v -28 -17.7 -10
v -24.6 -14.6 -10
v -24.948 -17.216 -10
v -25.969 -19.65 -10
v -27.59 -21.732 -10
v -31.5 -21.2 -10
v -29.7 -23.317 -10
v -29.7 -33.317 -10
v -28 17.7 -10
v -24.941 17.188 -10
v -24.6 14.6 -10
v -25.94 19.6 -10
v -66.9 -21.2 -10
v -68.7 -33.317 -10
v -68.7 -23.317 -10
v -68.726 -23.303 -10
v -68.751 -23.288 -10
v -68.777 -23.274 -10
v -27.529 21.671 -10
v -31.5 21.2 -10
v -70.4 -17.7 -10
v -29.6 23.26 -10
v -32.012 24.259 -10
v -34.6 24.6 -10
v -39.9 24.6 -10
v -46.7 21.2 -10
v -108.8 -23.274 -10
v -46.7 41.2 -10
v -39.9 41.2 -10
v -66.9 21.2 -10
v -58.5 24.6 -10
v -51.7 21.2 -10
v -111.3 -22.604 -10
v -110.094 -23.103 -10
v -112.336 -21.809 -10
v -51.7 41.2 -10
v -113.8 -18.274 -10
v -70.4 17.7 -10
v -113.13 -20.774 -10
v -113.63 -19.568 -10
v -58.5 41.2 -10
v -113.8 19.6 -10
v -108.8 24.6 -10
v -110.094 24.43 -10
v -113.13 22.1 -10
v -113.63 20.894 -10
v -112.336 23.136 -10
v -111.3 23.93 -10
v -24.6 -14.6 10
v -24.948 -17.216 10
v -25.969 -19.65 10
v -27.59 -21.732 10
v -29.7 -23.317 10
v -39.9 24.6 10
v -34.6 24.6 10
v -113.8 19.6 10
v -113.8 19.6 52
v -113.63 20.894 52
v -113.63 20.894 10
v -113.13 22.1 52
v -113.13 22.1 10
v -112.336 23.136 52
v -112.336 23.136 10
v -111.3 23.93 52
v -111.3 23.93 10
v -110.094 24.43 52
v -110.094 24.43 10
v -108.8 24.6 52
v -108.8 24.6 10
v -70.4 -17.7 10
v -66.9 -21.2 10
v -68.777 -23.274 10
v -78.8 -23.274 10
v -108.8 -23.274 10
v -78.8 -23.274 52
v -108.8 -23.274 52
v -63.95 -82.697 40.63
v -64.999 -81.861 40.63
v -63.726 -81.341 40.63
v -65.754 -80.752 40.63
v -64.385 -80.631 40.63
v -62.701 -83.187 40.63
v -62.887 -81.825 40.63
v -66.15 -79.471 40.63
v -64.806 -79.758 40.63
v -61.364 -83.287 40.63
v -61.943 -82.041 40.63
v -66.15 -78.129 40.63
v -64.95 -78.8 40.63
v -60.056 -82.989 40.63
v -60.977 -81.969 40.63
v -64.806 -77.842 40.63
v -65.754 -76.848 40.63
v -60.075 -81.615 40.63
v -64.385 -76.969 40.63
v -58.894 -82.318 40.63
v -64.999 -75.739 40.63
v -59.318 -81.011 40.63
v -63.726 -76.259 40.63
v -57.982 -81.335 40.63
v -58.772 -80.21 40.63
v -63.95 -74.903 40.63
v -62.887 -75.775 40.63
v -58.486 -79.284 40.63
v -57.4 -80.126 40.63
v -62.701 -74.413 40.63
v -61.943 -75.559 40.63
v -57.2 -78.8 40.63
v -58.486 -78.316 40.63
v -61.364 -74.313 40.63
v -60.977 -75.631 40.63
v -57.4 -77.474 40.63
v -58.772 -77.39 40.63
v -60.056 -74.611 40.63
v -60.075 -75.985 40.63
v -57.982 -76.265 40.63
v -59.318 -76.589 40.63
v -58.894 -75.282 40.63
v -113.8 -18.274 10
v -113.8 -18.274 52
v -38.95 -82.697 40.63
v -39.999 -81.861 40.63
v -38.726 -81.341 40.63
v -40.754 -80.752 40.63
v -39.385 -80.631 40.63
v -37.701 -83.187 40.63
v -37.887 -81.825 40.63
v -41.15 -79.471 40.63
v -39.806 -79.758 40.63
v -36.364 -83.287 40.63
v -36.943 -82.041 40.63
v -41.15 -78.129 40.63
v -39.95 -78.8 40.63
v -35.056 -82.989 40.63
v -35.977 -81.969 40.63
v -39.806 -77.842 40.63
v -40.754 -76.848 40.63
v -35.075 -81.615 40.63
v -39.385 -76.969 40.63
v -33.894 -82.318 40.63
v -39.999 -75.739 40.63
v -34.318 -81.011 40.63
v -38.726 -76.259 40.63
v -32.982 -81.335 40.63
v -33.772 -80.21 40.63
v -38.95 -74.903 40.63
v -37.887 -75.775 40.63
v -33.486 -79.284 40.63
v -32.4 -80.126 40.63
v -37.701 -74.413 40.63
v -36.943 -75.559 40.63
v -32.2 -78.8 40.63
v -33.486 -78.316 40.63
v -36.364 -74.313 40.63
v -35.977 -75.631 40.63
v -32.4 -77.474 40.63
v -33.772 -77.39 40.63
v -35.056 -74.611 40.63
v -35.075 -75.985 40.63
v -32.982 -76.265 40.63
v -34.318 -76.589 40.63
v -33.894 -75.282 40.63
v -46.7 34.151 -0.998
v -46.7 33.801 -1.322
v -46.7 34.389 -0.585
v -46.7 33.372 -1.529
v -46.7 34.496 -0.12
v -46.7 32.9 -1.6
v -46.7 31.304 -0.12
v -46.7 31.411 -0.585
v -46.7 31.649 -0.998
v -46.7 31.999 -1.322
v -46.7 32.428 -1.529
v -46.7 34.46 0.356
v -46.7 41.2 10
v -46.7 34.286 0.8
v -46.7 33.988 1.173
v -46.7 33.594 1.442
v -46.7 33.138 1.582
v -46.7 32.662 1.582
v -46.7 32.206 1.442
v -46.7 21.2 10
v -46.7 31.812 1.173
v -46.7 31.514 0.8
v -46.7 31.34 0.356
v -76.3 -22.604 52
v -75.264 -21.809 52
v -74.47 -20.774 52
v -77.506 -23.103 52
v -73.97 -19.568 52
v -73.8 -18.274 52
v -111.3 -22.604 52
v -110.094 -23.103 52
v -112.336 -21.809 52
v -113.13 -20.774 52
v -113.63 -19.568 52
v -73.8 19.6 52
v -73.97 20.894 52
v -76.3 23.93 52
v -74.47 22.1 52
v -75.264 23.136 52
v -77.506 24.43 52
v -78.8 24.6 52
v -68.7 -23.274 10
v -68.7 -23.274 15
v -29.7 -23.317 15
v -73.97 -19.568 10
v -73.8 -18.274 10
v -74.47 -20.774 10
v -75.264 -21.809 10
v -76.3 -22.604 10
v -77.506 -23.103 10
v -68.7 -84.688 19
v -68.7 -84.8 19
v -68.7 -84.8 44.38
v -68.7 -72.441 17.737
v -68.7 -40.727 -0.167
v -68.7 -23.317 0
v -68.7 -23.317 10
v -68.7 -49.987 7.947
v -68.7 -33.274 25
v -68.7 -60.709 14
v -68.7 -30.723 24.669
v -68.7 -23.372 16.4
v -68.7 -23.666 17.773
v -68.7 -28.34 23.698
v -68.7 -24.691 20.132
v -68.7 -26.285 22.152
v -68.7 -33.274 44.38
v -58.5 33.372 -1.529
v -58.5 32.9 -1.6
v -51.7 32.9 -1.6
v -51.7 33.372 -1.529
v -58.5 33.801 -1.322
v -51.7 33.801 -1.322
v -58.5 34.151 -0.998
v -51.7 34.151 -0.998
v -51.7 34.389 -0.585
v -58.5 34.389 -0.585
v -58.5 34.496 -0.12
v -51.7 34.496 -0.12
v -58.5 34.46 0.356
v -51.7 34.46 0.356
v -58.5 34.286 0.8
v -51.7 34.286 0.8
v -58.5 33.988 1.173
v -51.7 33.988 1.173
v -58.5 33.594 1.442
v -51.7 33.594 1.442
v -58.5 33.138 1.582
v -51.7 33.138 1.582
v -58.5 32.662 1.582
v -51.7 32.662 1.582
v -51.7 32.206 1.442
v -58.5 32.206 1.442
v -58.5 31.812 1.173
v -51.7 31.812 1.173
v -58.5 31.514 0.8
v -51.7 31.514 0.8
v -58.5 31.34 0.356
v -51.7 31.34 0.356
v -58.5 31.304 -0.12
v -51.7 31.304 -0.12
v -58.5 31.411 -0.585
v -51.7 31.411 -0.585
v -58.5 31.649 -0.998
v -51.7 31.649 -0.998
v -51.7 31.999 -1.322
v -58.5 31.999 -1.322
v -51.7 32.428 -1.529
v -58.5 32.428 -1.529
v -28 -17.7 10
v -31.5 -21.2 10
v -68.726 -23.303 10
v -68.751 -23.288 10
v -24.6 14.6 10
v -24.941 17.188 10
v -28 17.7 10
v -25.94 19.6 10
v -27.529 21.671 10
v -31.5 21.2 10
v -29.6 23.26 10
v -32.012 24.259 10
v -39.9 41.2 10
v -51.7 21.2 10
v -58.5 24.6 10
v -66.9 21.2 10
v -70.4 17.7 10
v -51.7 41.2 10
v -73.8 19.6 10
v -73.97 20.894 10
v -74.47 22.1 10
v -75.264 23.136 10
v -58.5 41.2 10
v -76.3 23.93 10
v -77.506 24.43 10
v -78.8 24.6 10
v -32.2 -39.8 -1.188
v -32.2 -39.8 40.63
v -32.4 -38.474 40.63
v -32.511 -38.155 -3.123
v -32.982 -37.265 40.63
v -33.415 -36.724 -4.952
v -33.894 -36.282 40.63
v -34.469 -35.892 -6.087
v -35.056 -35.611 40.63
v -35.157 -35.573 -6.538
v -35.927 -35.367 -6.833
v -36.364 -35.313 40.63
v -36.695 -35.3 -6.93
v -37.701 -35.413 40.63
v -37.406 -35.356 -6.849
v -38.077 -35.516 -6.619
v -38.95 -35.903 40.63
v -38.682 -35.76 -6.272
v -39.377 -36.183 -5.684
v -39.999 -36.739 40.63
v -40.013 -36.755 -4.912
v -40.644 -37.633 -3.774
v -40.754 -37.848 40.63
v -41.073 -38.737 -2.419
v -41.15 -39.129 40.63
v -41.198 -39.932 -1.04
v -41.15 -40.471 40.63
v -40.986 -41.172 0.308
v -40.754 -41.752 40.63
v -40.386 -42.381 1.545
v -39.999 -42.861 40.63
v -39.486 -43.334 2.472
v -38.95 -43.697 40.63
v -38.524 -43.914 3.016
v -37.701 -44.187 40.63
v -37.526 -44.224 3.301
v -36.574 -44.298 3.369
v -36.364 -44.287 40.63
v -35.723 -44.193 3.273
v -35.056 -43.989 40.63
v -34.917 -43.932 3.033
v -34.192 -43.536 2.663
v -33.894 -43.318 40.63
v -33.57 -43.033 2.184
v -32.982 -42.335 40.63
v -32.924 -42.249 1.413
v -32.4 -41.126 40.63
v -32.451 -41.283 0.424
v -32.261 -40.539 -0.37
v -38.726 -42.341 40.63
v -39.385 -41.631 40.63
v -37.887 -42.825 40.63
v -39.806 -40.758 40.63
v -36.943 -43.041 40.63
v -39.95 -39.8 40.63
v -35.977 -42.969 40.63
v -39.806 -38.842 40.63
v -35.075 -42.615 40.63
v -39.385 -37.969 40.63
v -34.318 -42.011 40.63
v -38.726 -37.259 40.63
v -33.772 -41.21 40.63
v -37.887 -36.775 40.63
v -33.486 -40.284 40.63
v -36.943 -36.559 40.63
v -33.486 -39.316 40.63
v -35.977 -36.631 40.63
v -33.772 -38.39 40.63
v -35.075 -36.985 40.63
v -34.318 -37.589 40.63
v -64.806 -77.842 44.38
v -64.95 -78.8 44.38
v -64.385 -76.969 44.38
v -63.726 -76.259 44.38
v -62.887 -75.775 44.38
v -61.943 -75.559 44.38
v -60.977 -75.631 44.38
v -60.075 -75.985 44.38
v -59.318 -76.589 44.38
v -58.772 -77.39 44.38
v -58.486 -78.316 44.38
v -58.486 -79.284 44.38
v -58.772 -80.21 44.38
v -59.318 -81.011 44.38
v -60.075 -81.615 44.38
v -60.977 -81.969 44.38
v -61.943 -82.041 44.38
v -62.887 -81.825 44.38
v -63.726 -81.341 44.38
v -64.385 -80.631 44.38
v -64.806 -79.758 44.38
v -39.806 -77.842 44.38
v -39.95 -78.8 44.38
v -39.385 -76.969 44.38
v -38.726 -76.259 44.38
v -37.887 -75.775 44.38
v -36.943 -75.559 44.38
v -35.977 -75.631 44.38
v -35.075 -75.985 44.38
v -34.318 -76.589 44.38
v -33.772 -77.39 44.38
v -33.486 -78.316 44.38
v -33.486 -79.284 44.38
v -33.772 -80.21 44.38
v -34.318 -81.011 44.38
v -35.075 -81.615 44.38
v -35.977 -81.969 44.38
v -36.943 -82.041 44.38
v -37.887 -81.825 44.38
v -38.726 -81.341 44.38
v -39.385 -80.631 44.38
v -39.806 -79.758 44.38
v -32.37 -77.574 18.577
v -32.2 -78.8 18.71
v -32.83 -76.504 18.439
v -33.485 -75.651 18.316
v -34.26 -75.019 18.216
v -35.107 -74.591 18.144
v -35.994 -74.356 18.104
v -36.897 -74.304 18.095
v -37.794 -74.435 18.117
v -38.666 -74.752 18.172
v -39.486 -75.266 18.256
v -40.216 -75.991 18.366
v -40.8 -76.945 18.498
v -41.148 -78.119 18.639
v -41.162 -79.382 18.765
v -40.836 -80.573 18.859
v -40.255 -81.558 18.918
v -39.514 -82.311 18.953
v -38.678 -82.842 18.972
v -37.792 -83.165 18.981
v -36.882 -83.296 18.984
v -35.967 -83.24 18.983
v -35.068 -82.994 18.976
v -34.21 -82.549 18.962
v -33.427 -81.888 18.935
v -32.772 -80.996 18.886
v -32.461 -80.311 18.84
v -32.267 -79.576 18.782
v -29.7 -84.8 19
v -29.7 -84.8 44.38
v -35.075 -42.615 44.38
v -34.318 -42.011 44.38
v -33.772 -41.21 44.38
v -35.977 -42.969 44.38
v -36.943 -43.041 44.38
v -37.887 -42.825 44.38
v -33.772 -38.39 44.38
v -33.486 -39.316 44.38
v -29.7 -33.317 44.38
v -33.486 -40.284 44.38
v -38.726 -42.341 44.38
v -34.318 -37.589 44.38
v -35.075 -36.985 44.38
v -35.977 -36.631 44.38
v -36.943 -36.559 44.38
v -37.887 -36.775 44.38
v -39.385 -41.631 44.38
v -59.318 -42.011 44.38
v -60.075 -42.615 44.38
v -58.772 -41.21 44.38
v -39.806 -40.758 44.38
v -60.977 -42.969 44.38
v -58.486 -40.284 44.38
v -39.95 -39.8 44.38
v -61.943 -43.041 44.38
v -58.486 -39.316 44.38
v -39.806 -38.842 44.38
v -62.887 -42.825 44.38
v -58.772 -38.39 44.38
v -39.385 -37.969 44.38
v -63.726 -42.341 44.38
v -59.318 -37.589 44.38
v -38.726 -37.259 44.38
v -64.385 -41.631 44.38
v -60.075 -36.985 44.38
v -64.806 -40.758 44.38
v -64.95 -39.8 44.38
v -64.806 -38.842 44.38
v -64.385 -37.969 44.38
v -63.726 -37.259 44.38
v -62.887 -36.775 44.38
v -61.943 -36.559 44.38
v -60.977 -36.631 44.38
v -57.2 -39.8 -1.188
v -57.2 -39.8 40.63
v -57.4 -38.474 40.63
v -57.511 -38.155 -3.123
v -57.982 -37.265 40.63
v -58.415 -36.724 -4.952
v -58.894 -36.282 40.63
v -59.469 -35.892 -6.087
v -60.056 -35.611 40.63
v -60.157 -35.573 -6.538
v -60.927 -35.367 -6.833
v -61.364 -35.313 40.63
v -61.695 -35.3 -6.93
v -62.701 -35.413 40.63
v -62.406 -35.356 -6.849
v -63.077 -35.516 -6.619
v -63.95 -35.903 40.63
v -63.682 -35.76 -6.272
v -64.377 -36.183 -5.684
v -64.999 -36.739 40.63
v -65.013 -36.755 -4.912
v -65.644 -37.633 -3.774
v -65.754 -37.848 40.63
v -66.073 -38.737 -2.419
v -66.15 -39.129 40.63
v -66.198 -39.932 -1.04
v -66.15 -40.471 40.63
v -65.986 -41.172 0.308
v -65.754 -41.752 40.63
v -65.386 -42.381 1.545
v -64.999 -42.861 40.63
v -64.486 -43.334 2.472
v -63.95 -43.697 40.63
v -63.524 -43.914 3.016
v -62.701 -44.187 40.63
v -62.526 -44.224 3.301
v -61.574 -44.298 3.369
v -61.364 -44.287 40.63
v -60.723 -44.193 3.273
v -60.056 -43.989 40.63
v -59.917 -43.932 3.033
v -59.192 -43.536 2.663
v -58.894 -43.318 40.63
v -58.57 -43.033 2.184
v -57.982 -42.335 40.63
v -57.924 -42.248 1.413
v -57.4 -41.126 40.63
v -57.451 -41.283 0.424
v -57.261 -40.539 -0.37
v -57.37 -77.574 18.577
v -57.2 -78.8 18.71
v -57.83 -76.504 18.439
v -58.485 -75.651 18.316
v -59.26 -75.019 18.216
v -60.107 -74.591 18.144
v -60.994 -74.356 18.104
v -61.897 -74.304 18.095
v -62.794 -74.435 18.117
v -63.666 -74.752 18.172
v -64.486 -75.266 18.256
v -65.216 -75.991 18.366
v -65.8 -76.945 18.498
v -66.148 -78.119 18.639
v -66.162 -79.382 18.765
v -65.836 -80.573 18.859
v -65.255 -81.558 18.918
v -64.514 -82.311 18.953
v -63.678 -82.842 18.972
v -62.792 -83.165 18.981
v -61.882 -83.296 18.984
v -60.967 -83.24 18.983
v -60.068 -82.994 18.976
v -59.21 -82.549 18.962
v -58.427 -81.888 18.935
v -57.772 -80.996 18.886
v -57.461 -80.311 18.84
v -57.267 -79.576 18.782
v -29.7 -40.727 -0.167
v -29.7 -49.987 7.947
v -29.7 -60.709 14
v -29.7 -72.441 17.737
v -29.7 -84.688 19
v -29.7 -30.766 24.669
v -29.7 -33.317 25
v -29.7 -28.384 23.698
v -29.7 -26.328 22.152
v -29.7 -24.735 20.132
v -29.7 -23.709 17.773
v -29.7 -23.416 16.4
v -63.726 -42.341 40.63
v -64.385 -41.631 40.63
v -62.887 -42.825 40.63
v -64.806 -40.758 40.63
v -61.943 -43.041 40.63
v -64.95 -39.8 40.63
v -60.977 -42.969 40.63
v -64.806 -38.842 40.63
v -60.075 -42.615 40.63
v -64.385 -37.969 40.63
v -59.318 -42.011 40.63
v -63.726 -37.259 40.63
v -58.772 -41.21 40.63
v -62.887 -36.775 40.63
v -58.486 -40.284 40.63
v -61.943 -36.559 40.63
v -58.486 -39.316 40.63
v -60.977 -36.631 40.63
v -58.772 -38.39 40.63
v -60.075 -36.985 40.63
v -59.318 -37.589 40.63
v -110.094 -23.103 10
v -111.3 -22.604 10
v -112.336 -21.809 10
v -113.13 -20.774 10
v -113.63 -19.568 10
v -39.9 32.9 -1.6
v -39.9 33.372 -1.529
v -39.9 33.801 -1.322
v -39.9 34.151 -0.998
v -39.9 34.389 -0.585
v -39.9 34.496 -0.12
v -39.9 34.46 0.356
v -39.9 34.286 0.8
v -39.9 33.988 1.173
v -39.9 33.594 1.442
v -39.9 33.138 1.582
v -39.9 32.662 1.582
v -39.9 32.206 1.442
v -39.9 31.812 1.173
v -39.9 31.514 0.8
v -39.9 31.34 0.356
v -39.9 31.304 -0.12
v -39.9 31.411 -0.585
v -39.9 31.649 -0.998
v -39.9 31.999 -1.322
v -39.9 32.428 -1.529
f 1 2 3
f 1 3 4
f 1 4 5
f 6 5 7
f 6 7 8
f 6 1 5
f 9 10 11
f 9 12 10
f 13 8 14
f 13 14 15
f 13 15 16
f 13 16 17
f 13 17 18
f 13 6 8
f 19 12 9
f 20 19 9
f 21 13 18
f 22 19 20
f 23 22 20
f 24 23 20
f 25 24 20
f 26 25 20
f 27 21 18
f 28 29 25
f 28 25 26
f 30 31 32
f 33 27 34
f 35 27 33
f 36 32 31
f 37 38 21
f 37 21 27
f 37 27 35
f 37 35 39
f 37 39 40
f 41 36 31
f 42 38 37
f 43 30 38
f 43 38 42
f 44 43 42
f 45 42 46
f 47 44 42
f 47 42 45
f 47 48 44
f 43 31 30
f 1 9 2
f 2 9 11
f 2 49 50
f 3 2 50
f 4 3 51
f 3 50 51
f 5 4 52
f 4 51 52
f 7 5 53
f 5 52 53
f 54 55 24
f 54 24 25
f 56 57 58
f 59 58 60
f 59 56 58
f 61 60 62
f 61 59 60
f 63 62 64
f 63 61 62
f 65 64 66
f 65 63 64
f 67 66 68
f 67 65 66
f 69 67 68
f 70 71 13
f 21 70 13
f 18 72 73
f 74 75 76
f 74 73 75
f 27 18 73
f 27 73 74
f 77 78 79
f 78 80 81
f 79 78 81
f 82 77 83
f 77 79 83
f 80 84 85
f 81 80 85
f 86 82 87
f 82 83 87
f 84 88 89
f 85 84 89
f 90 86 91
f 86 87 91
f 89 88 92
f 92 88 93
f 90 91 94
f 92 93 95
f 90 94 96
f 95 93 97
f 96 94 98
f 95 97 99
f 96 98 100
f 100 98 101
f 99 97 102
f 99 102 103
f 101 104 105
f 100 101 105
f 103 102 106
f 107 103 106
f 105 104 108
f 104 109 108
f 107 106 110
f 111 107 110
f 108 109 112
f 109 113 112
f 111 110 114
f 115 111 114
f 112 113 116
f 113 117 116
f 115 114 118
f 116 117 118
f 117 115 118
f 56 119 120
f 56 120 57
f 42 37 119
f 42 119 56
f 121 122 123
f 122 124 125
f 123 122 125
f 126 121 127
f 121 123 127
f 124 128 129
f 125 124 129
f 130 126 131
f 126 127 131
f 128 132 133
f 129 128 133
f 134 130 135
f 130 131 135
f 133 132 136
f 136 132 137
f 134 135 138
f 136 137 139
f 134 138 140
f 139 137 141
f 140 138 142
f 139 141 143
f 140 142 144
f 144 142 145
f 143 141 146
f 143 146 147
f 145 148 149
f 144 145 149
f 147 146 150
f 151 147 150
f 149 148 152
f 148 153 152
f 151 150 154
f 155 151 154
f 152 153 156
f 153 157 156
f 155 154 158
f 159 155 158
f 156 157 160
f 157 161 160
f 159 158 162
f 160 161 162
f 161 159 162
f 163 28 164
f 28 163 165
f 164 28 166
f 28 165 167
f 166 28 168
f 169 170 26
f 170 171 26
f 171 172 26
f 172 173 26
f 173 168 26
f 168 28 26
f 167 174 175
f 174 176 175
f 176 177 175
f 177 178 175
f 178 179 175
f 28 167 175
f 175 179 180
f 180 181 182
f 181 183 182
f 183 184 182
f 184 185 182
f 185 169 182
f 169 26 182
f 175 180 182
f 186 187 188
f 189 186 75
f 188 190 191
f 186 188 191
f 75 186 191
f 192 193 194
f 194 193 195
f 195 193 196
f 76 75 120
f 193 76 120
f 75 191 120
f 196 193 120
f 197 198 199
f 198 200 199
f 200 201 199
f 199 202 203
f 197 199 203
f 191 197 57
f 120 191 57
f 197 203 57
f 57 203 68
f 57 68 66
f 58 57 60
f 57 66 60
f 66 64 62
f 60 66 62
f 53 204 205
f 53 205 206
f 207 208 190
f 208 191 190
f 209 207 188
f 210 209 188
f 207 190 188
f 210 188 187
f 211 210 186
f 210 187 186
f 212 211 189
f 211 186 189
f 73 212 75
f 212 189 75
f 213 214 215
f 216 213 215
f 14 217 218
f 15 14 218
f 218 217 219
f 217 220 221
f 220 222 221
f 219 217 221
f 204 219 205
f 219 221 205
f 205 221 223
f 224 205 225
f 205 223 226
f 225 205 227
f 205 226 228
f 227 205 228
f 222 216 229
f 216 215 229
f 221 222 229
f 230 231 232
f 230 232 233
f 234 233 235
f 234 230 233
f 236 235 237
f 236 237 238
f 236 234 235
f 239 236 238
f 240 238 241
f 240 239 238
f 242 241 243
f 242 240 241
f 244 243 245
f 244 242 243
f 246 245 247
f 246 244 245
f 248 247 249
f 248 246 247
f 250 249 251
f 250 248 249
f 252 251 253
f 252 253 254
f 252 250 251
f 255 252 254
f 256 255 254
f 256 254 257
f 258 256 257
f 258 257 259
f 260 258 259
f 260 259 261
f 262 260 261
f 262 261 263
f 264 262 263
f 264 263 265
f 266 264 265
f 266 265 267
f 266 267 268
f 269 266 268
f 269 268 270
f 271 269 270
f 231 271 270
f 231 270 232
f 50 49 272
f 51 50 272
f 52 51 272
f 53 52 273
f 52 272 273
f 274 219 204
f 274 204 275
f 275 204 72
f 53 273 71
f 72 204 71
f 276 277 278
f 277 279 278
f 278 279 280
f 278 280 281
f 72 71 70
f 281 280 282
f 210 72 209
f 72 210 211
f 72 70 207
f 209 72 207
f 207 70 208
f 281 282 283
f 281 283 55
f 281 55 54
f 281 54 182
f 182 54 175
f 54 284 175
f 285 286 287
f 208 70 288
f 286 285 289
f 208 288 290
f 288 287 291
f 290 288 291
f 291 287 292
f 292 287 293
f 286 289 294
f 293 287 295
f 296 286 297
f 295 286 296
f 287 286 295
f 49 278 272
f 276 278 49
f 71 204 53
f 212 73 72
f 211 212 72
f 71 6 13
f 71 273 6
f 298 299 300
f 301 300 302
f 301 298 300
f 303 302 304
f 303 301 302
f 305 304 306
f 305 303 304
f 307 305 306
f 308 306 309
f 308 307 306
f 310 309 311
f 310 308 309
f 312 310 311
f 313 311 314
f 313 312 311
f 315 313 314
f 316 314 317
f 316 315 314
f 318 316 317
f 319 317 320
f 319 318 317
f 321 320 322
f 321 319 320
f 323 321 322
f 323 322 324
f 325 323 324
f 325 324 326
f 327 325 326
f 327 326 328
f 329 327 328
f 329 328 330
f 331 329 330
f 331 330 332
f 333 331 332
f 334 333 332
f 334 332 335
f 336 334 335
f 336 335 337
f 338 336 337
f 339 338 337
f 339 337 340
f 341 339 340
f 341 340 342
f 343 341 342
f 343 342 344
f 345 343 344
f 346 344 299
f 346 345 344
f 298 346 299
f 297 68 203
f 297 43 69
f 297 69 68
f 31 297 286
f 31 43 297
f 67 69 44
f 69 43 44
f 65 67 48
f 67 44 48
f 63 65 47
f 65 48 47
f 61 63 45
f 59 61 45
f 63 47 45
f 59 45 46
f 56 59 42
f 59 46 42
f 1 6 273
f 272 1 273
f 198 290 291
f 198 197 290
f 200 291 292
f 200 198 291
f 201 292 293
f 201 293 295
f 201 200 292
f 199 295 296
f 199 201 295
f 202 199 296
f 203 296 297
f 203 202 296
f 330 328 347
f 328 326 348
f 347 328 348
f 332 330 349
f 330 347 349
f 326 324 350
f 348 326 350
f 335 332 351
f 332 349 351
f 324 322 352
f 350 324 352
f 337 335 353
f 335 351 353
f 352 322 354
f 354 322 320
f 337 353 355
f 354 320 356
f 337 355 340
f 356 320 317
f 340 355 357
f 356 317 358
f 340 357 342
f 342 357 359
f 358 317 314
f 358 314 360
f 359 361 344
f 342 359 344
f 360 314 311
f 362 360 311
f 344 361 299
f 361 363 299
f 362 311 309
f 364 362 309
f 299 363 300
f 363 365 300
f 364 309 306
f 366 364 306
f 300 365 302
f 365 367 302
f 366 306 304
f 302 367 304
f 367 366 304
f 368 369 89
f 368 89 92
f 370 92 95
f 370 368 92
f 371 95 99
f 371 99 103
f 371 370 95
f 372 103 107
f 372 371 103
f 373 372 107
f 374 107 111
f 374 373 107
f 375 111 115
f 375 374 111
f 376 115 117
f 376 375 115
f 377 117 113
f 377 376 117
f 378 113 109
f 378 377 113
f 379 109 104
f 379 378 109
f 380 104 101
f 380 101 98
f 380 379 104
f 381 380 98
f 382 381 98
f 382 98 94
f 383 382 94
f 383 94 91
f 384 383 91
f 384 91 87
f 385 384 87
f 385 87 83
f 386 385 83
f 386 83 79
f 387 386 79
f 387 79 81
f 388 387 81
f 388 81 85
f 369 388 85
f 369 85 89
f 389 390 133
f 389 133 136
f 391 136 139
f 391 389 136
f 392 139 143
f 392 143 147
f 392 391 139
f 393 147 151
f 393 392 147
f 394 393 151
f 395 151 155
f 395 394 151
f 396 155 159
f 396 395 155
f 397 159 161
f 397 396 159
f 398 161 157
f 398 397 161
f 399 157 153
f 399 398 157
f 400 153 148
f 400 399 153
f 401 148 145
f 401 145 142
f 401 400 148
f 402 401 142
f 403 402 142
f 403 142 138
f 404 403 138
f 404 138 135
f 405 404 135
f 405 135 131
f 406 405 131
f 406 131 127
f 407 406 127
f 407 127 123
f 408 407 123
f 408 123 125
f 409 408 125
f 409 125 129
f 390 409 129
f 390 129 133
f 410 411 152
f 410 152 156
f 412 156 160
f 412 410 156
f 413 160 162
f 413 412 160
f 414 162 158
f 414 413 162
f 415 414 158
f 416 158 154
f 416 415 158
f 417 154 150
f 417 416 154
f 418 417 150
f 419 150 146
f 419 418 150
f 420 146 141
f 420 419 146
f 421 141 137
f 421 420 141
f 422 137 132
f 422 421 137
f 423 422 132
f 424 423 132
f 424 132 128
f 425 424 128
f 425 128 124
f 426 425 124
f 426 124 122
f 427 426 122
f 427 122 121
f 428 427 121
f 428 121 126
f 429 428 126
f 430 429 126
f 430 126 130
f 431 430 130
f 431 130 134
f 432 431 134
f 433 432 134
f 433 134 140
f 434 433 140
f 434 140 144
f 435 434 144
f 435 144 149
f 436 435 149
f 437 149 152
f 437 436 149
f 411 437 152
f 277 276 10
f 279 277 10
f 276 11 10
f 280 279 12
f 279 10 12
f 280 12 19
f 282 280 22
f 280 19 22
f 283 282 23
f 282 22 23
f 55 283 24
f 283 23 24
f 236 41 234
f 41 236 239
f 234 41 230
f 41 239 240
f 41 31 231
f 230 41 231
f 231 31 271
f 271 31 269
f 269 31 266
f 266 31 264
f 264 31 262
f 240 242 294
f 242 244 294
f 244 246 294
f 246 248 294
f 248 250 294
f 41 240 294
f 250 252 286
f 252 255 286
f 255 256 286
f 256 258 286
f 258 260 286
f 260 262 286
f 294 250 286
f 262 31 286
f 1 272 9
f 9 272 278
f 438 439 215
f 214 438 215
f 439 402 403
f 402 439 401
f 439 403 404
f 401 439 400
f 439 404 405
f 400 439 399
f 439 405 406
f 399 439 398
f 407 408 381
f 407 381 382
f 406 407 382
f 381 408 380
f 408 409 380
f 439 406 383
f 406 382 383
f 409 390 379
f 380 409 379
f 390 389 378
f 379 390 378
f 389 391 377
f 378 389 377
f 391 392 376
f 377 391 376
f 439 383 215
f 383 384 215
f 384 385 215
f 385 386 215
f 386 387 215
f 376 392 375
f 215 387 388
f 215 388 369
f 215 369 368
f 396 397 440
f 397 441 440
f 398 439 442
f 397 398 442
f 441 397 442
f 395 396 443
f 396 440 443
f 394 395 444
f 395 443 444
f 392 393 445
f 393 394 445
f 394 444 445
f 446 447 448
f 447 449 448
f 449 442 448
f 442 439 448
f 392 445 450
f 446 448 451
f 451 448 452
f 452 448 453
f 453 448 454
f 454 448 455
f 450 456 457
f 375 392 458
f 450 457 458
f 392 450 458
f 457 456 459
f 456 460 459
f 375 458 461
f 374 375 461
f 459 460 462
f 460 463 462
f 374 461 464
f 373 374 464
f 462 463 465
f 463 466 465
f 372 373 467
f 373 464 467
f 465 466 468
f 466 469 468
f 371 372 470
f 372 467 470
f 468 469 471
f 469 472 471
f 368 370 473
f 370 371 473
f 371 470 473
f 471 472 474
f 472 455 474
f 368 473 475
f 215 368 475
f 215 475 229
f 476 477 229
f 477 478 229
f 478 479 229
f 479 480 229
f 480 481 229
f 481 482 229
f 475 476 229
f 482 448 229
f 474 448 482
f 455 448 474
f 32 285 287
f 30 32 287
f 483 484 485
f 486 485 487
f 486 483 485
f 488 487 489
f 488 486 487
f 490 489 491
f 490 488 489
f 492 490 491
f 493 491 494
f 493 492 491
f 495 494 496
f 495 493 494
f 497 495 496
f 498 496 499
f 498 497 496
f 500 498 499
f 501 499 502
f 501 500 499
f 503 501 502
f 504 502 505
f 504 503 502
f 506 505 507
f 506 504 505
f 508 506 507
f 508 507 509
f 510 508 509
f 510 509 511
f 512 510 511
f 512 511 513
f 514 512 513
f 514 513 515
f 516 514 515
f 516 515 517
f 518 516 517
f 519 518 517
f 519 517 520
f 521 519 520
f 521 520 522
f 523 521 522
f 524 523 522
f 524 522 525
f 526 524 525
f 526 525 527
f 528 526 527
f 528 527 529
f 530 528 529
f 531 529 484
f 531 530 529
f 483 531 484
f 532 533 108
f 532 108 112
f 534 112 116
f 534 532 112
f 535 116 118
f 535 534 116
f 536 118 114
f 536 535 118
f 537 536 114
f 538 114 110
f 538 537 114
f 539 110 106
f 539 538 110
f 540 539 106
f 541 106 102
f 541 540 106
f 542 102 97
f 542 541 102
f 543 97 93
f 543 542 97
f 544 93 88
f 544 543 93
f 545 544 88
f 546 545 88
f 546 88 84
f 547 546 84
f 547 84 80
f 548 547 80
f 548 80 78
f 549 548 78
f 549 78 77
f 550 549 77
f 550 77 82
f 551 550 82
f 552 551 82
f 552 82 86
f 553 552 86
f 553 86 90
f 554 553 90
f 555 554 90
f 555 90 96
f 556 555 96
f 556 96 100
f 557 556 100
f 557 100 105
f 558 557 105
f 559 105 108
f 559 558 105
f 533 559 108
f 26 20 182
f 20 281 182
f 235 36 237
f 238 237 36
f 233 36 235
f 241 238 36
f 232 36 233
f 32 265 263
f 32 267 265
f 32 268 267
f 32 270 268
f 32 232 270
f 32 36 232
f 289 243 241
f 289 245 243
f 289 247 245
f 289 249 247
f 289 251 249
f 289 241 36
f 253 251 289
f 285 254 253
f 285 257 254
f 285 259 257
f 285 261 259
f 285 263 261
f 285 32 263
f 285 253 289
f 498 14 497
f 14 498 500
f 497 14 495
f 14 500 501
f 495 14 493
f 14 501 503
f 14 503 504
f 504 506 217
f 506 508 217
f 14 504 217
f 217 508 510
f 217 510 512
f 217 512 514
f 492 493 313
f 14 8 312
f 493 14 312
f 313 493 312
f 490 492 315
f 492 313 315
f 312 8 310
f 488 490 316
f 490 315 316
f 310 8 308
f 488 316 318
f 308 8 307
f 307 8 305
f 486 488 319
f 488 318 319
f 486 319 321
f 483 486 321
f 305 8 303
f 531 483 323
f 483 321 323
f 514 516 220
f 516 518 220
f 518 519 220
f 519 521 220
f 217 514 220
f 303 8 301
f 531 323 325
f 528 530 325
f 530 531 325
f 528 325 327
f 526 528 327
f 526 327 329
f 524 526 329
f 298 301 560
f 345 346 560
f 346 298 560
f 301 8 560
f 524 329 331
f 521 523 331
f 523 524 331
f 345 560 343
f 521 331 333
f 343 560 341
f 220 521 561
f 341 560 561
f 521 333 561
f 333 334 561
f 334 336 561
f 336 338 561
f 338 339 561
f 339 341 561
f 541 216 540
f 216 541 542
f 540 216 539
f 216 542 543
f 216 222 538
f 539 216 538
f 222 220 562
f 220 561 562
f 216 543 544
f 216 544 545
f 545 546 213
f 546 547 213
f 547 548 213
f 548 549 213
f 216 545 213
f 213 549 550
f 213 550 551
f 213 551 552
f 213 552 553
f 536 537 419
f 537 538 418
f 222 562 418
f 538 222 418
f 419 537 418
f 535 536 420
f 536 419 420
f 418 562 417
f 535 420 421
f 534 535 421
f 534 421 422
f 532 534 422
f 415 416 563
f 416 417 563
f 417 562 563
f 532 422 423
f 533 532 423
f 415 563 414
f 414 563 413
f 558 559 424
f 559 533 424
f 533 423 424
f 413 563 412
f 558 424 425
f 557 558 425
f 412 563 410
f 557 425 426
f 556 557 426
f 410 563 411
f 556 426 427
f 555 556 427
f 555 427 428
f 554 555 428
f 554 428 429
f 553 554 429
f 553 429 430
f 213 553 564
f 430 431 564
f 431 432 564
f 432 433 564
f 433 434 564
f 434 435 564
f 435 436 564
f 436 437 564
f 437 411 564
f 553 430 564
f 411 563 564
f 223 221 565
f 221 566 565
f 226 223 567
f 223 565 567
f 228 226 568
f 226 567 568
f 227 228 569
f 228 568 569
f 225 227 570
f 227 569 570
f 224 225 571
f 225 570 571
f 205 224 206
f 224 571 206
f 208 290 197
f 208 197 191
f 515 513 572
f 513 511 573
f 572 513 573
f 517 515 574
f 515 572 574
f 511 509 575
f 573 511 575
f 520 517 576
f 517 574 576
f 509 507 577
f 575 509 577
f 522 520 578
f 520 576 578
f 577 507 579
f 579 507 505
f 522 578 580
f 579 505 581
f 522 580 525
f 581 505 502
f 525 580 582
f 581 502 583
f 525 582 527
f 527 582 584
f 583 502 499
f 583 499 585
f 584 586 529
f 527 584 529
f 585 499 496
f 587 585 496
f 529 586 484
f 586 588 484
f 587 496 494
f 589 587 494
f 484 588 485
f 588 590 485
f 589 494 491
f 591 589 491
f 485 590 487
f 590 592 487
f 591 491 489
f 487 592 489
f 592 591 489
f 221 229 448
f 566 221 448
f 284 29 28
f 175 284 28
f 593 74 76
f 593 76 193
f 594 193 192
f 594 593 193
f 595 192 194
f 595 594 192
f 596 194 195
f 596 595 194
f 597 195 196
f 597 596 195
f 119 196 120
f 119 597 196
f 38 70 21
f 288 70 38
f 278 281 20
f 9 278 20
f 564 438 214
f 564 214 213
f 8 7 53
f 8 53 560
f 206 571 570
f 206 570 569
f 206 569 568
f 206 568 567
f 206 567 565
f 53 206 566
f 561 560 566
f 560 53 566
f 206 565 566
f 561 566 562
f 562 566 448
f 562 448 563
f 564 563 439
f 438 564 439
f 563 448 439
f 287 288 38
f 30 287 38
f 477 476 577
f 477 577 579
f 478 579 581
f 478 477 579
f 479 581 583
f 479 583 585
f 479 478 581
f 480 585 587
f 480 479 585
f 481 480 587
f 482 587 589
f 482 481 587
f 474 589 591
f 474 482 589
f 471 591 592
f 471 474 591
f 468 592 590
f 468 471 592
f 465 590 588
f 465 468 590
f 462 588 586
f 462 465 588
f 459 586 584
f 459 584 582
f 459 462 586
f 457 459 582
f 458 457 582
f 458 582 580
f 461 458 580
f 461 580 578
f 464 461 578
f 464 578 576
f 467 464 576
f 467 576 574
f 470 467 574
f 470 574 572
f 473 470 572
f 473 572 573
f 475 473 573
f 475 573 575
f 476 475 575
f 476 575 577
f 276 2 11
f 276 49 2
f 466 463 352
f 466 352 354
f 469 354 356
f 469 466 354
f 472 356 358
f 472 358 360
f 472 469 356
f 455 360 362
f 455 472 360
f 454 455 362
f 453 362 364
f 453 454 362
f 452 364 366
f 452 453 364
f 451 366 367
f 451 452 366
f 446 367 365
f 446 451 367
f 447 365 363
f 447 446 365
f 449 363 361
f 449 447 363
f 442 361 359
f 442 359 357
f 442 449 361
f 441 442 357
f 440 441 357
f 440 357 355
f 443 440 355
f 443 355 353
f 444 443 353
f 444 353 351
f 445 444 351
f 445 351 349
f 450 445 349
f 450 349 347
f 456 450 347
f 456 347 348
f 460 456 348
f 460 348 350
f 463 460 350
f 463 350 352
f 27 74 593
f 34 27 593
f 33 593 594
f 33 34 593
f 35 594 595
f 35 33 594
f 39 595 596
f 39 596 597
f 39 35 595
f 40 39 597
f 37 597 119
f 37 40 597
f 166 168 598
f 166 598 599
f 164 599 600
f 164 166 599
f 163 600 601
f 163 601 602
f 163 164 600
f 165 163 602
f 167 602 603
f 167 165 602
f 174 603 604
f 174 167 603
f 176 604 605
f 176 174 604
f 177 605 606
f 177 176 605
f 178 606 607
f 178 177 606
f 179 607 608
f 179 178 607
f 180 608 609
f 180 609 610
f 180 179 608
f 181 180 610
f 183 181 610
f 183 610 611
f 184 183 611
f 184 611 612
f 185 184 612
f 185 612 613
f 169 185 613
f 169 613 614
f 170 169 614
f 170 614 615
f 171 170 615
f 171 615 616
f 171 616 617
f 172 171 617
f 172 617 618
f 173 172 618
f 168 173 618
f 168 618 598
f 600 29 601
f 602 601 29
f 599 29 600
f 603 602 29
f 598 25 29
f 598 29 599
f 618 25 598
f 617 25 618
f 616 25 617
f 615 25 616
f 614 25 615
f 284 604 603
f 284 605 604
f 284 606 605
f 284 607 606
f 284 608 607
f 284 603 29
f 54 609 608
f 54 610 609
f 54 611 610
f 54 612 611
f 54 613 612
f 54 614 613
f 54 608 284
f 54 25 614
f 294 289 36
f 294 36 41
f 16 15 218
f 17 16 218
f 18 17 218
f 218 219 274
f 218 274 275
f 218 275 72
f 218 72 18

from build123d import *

# Parameters (mm, degrees)
SKETCH1_W           = 49.2
SKETCH1_H           = 49.2
SKETCH1_W_2         = 42.4
SKETCH1_H_2         = 42.4
BOSS_EXTRUDE1_DEPTH = 10
CHAMFER1_SIZE       = 3.5
FILLET1_R           = 10
CUT_EXTRUDE1_REACH  = 42.129
SKETCH2_W           = 18.6
SKETCH2_H           = 6.8
SKETCH4_W           = 6.8
SKETCH4_H           = 20
BOSS_EXTRUDE2_DEPTH = 20
SKETCH5_R           = 1.6
CUT_EXTRUDE2_DEPTH  = 55.283054446
BOSS_EXTRUDE3_DEPTH = 25
SKETCH8_W           = 39
SKETCH8_H           = 10
BOSS_EXTRUDE4_DEPTH = 10
FILLET3_R           = 10
CUT_EXTRUDE3_REACH  = 100.797
SKETCH10_W          = 19
SKETCH10_H          = 51.482775671
FILLET4_R           = 60
SKETCH11_R          = 3.25
CUT_EXTRUDE4_DEPTH  = 95.979997894
SKETCH15_R          = 4.5
CUT_EXTRUDE6_DEPTH  = 31.25
SKETCH16_R          = 4.5
CUT_EXTRUDE7_DEPTH  = 31.25
BOSS_EXTRUDE5_START = 19.38
SKETCH17_R          = 3.25
BOSS_EXTRUDE5_DEPTH = 19.38
SKETCH18_R          = 4.5
CUT_EXTRUDE8_DEPTH  = 19.38
BOSS_EXTRUDE6_DEPTH = 20
FILLET6_R           = 5
BOSS_EXTRUDE7_DEPTH = 42
FILLET7_R           = 5


with BuildPart() as part:
    # Sketch1 → Boss-Extrude1 (new, symmetric)
    with BuildSketch(Plane.XY):
        Rectangle(SKETCH1_W, SKETCH1_H)
        Rectangle(SKETCH1_W_2, SKETCH1_H_2, mode=Mode.SUBTRACT)
    extrude(amount=BOSS_EXTRUDE1_DEPTH, both=True)

    # Chamfer1
    chamfer1_edges = [part.edges().sort_by_distance(p)[0] for p in [
        (21.2, -21.2, 0),
        (21.2, 21.2, 0),
        (-21.2, 21.2, 0),
        (-21.2, -21.2, 0),
    ]]
    chamfer(chamfer1_edges, length=CHAMFER1_SIZE)

    # Fillet1
    fillet1_edges = [part.edges().sort_by_distance(p)[0] for p in [
        (24.6, -24.6, 0),
        (-24.6, -24.6, 0),
        (-24.6, 24.6, 0),
        (24.6, 24.6, 0),
    ]]
    fillet(fillet1_edges, radius=FILLET1_R)

    # Sketch2 → Cut-Extrude1 (cut, up to next)
    with BuildSketch(Plane.XY.offset(10), mode=Mode.PRIVATE) as cut_extrude1_sk1:
        with Locations((0, 21.2)):
            Rectangle(SKETCH2_W, SKETCH2_H)
    cut_extrude1_tool1 = extrude(cut_extrude1_sk1.sketch, amount=-CUT_EXTRUDE1_REACH, mode=Mode.PRIVATE) & part.part
    add(cut_extrude1_tool1.solids().sort_by_distance((0, 21.2, 10))[0], mode=Mode.SUBTRACT)

    # Sketch4 → Boss-Extrude2 (add)
    with BuildSketch(Plane.XZ.offset(-21.2)):
        with Locations((-5.9, 0)):
            Rectangle(SKETCH4_W, SKETCH4_H)
        with Locations((5.9, 0)):
            Rectangle(SKETCH4_W, SKETCH4_H)
    extrude(amount=-BOSS_EXTRUDE2_DEPTH)

    # Sketch5 → Cut-Extrude2 (cut, through all)
    with BuildSketch(Plane(origin=(9.3, 0, 0), x_dir=(0, 0, -1), z_dir=(1, 0, 0))):
        with Locations((0, 32.9)):
            Circle(SKETCH5_R)
    extrude(amount=-CUT_EXTRUDE2_DEPTH, mode=Mode.SUBTRACT)

    # Sketch7 → Boss-Extrude3 (add)
    with BuildSketch(Plane.XY):
        Polygon((-19.5, -24.6), (-19.5, -84.8), (19.5, -84.8), (19.5, -24.6), (19.5, -23.273751878), (-19.5, -23.317224329), align=None)
    extrude(amount=BOSS_EXTRUDE3_DEPTH)

    # Sketch8 → Boss-Extrude4 (add)
    with BuildSketch(Plane(origin=(0, 0, 0), x_dir=(-1, 0, 0), z_dir=(0, 0, -1))):
        with Locations((0, -28.317224329)):
            Rectangle(SKETCH8_W, SKETCH8_H)
    extrude(amount=BOSS_EXTRUDE4_DEPTH)

    # Fillet3
    fillet3_edges = [part.edges().sort_by_distance(p)[0] for p in [
        (0, -23.295488103, 25),
    ]]
    fillet(fillet3_edges, radius=FILLET3_R)

    # Sketch10 → Cut-Extrude3 (cut, up to next)
    with BuildSketch(Plane.ZY.offset(19.5), mode=Mode.PRIVATE) as cut_extrude3_sk1:
        with Locations((9.5, -59.058612165)):
            Rectangle(SKETCH10_W, SKETCH10_H)
    cut_extrude3_tool1 = extrude(cut_extrude3_sk1.sketch, amount=-CUT_EXTRUDE3_REACH, mode=Mode.PRIVATE) & part.part
    add(cut_extrude3_tool1.solids().sort_by_distance((-19.5, -59.058612, 9.5))[0], mode=Mode.SUBTRACT)

    # Fillet4
    # the kernel refuses this fillet: 60 mm, written as the material it adds along each edge
    with BuildSketch(Plane(origin=(-19.5, -33.317224329, 19), x_dir=(0, -1, 0), z_dir=(1, 0, 0))) as fillet4_piece_1:
        with BuildLine():
            CenterArc((51.371198156, 60), FILLET4_R, 211.108922511, 58.891077489)
            Line((0, 29), (0, 0))
            Line((0, 0), (51.371198156, 0))
        make_face()
    extrude(amount=39)

    # Sketch11 → Cut-Extrude4 (cut, through all)
    with BuildSketch(Plane.XY.offset(25)):
        with Locations((-12.5, -39.8)):
            Circle(SKETCH11_R)
        with Locations((12.5, -39.8)):
            Circle(SKETCH11_R)
        with Locations((-12.5, -78.8)):
            Circle(SKETCH11_R)
        with Locations((12.5, -78.8)):
            Circle(SKETCH11_R)
    extrude(amount=-CUT_EXTRUDE4_DEPTH, mode=Mode.SUBTRACT)

    # Sketch15 → Cut-Extrude6 (cut)
    with BuildSketch(Plane(origin=(0, 0, -10), x_dir=(-1, 0, 0), z_dir=(0, 0, -1))):
        with Locations((-12.5, -39.8)):
            Circle(SKETCH15_R)
        with Locations((12.5, -39.8)):
            Circle(SKETCH15_R)
    extrude(amount=-CUT_EXTRUDE6_DEPTH, mode=Mode.SUBTRACT)

    # Sketch16 → Cut-Extrude7 (cut)
    with BuildSketch(Plane(origin=(0, 0, -10), x_dir=(-1, 0, 0), z_dir=(0, 0, -1))):
        with Locations((-12.5, -78.8)):
            Circle(SKETCH16_R)
        with Locations((12.5, -78.8)):
            Circle(SKETCH16_R)
    extrude(amount=-CUT_EXTRUDE7_DEPTH, mode=Mode.SUBTRACT)

    # Sketch17 → Boss-Extrude5 (add)
    with BuildSketch(Plane.XY.offset(25).offset(BOSS_EXTRUDE5_START)):
        Polygon((19.5, -84.8), (19.5, -33.27375809), (-19.5, -33.317230541), (-19.5, -84.8), align=None)
        with Locations((-12.5, -78.8)):
            Circle(SKETCH17_R, mode=Mode.SUBTRACT)
        with Locations((12.5, -78.8)):
            Circle(SKETCH17_R, mode=Mode.SUBTRACT)
        with Locations((12.5, -39.8)):
            Circle(SKETCH17_R, mode=Mode.SUBTRACT)
        with Locations((-12.5, -39.8)):
            Circle(SKETCH17_R, mode=Mode.SUBTRACT)
    extrude(amount=-BOSS_EXTRUDE5_DEPTH)

    # Sketch18 → Cut-Extrude8 (cut)
    with BuildSketch(Plane(origin=(0, 0, 21.25), x_dir=(-1, 0, 0), z_dir=(0, 0, -1))):
        with Locations((12.5, -78.8)):
            Circle(SKETCH18_R)
        with Locations((-12.5, -78.8)):
            Circle(SKETCH18_R)
        with Locations((12.5, -39.8)):
            Circle(SKETCH18_R)
        with Locations((-12.5, -39.8)):
            Circle(SKETCH18_R)
    extrude(amount=-CUT_EXTRUDE8_DEPTH, mode=Mode.SUBTRACT)

    # Sketch20 → Boss-Extrude6 (add)
    with BuildSketch(Plane.XY.offset(10)):
        with BuildLine():
            Line((64.6, 24.6), (14.6, 24.6))
            ThreePointArc((14.6, 24.6), (21.671067812, 21.671067812), (24.6, 14.6))
            Line((24.6, 14.6), (24.6, -14.6))
            ThreePointArc((24.6, -14.6), (23.253481333, -19.611712364), (19.576547836, -23.273751878))
            Line((19.576547836, -23.273751878), (64.6, -23.273751878))
            Line((64.6, -23.273751878), (64.6, 24.6))
        make_face()
    extrude(amount=-BOSS_EXTRUDE6_DEPTH)

    # Fillet6
    fillet6_edges = [part.edges().sort_by_distance(p)[0] for p in [
        (64.6, -23.273751878, 0),
        (64.6, 24.6, 0),
    ]]
    fillet(fillet6_edges, radius=FILLET6_R)

    # Sketch21 → Boss-Extrude7 (add)
    with BuildSketch(Plane.XY.offset(10)):
        with BuildLine():
            Line((24.6, 24.6), (24.6, -23.273751878))
            Line((24.6, -23.273751878), (59.6, -23.273751878))
            ThreePointArc((59.6, -23.273751878), (63.135533906, -21.809285784), (64.6, -18.273751878))
            Line((64.6, -18.273751878), (64.6, 19.6))
            ThreePointArc((64.6, 19.6), (63.135533906, 23.135533906), (59.6, 24.6))
            Line((59.6, 24.6), (24.6, 24.6))
        make_face()
    extrude(amount=BOSS_EXTRUDE7_DEPTH)

    # Fillet7
    fillet7_edges = [part.edges().sort_by_distance(p)[0] for p in [
        (24.6, 24.6, 31),
        (24.6, -23.273751878, 31),
    ]]
    fillet(fillet7_edges, radius=FILLET7_R)


with BuildPart() as body_2:
    # Mirror1: mirrored copy
    add(part.part.mirror(Plane(origin=(-24.6, -24.6, 10), x_dir=(0, 0, 1), z_dir=(1, 0, 0))))


solid = body_2.part
